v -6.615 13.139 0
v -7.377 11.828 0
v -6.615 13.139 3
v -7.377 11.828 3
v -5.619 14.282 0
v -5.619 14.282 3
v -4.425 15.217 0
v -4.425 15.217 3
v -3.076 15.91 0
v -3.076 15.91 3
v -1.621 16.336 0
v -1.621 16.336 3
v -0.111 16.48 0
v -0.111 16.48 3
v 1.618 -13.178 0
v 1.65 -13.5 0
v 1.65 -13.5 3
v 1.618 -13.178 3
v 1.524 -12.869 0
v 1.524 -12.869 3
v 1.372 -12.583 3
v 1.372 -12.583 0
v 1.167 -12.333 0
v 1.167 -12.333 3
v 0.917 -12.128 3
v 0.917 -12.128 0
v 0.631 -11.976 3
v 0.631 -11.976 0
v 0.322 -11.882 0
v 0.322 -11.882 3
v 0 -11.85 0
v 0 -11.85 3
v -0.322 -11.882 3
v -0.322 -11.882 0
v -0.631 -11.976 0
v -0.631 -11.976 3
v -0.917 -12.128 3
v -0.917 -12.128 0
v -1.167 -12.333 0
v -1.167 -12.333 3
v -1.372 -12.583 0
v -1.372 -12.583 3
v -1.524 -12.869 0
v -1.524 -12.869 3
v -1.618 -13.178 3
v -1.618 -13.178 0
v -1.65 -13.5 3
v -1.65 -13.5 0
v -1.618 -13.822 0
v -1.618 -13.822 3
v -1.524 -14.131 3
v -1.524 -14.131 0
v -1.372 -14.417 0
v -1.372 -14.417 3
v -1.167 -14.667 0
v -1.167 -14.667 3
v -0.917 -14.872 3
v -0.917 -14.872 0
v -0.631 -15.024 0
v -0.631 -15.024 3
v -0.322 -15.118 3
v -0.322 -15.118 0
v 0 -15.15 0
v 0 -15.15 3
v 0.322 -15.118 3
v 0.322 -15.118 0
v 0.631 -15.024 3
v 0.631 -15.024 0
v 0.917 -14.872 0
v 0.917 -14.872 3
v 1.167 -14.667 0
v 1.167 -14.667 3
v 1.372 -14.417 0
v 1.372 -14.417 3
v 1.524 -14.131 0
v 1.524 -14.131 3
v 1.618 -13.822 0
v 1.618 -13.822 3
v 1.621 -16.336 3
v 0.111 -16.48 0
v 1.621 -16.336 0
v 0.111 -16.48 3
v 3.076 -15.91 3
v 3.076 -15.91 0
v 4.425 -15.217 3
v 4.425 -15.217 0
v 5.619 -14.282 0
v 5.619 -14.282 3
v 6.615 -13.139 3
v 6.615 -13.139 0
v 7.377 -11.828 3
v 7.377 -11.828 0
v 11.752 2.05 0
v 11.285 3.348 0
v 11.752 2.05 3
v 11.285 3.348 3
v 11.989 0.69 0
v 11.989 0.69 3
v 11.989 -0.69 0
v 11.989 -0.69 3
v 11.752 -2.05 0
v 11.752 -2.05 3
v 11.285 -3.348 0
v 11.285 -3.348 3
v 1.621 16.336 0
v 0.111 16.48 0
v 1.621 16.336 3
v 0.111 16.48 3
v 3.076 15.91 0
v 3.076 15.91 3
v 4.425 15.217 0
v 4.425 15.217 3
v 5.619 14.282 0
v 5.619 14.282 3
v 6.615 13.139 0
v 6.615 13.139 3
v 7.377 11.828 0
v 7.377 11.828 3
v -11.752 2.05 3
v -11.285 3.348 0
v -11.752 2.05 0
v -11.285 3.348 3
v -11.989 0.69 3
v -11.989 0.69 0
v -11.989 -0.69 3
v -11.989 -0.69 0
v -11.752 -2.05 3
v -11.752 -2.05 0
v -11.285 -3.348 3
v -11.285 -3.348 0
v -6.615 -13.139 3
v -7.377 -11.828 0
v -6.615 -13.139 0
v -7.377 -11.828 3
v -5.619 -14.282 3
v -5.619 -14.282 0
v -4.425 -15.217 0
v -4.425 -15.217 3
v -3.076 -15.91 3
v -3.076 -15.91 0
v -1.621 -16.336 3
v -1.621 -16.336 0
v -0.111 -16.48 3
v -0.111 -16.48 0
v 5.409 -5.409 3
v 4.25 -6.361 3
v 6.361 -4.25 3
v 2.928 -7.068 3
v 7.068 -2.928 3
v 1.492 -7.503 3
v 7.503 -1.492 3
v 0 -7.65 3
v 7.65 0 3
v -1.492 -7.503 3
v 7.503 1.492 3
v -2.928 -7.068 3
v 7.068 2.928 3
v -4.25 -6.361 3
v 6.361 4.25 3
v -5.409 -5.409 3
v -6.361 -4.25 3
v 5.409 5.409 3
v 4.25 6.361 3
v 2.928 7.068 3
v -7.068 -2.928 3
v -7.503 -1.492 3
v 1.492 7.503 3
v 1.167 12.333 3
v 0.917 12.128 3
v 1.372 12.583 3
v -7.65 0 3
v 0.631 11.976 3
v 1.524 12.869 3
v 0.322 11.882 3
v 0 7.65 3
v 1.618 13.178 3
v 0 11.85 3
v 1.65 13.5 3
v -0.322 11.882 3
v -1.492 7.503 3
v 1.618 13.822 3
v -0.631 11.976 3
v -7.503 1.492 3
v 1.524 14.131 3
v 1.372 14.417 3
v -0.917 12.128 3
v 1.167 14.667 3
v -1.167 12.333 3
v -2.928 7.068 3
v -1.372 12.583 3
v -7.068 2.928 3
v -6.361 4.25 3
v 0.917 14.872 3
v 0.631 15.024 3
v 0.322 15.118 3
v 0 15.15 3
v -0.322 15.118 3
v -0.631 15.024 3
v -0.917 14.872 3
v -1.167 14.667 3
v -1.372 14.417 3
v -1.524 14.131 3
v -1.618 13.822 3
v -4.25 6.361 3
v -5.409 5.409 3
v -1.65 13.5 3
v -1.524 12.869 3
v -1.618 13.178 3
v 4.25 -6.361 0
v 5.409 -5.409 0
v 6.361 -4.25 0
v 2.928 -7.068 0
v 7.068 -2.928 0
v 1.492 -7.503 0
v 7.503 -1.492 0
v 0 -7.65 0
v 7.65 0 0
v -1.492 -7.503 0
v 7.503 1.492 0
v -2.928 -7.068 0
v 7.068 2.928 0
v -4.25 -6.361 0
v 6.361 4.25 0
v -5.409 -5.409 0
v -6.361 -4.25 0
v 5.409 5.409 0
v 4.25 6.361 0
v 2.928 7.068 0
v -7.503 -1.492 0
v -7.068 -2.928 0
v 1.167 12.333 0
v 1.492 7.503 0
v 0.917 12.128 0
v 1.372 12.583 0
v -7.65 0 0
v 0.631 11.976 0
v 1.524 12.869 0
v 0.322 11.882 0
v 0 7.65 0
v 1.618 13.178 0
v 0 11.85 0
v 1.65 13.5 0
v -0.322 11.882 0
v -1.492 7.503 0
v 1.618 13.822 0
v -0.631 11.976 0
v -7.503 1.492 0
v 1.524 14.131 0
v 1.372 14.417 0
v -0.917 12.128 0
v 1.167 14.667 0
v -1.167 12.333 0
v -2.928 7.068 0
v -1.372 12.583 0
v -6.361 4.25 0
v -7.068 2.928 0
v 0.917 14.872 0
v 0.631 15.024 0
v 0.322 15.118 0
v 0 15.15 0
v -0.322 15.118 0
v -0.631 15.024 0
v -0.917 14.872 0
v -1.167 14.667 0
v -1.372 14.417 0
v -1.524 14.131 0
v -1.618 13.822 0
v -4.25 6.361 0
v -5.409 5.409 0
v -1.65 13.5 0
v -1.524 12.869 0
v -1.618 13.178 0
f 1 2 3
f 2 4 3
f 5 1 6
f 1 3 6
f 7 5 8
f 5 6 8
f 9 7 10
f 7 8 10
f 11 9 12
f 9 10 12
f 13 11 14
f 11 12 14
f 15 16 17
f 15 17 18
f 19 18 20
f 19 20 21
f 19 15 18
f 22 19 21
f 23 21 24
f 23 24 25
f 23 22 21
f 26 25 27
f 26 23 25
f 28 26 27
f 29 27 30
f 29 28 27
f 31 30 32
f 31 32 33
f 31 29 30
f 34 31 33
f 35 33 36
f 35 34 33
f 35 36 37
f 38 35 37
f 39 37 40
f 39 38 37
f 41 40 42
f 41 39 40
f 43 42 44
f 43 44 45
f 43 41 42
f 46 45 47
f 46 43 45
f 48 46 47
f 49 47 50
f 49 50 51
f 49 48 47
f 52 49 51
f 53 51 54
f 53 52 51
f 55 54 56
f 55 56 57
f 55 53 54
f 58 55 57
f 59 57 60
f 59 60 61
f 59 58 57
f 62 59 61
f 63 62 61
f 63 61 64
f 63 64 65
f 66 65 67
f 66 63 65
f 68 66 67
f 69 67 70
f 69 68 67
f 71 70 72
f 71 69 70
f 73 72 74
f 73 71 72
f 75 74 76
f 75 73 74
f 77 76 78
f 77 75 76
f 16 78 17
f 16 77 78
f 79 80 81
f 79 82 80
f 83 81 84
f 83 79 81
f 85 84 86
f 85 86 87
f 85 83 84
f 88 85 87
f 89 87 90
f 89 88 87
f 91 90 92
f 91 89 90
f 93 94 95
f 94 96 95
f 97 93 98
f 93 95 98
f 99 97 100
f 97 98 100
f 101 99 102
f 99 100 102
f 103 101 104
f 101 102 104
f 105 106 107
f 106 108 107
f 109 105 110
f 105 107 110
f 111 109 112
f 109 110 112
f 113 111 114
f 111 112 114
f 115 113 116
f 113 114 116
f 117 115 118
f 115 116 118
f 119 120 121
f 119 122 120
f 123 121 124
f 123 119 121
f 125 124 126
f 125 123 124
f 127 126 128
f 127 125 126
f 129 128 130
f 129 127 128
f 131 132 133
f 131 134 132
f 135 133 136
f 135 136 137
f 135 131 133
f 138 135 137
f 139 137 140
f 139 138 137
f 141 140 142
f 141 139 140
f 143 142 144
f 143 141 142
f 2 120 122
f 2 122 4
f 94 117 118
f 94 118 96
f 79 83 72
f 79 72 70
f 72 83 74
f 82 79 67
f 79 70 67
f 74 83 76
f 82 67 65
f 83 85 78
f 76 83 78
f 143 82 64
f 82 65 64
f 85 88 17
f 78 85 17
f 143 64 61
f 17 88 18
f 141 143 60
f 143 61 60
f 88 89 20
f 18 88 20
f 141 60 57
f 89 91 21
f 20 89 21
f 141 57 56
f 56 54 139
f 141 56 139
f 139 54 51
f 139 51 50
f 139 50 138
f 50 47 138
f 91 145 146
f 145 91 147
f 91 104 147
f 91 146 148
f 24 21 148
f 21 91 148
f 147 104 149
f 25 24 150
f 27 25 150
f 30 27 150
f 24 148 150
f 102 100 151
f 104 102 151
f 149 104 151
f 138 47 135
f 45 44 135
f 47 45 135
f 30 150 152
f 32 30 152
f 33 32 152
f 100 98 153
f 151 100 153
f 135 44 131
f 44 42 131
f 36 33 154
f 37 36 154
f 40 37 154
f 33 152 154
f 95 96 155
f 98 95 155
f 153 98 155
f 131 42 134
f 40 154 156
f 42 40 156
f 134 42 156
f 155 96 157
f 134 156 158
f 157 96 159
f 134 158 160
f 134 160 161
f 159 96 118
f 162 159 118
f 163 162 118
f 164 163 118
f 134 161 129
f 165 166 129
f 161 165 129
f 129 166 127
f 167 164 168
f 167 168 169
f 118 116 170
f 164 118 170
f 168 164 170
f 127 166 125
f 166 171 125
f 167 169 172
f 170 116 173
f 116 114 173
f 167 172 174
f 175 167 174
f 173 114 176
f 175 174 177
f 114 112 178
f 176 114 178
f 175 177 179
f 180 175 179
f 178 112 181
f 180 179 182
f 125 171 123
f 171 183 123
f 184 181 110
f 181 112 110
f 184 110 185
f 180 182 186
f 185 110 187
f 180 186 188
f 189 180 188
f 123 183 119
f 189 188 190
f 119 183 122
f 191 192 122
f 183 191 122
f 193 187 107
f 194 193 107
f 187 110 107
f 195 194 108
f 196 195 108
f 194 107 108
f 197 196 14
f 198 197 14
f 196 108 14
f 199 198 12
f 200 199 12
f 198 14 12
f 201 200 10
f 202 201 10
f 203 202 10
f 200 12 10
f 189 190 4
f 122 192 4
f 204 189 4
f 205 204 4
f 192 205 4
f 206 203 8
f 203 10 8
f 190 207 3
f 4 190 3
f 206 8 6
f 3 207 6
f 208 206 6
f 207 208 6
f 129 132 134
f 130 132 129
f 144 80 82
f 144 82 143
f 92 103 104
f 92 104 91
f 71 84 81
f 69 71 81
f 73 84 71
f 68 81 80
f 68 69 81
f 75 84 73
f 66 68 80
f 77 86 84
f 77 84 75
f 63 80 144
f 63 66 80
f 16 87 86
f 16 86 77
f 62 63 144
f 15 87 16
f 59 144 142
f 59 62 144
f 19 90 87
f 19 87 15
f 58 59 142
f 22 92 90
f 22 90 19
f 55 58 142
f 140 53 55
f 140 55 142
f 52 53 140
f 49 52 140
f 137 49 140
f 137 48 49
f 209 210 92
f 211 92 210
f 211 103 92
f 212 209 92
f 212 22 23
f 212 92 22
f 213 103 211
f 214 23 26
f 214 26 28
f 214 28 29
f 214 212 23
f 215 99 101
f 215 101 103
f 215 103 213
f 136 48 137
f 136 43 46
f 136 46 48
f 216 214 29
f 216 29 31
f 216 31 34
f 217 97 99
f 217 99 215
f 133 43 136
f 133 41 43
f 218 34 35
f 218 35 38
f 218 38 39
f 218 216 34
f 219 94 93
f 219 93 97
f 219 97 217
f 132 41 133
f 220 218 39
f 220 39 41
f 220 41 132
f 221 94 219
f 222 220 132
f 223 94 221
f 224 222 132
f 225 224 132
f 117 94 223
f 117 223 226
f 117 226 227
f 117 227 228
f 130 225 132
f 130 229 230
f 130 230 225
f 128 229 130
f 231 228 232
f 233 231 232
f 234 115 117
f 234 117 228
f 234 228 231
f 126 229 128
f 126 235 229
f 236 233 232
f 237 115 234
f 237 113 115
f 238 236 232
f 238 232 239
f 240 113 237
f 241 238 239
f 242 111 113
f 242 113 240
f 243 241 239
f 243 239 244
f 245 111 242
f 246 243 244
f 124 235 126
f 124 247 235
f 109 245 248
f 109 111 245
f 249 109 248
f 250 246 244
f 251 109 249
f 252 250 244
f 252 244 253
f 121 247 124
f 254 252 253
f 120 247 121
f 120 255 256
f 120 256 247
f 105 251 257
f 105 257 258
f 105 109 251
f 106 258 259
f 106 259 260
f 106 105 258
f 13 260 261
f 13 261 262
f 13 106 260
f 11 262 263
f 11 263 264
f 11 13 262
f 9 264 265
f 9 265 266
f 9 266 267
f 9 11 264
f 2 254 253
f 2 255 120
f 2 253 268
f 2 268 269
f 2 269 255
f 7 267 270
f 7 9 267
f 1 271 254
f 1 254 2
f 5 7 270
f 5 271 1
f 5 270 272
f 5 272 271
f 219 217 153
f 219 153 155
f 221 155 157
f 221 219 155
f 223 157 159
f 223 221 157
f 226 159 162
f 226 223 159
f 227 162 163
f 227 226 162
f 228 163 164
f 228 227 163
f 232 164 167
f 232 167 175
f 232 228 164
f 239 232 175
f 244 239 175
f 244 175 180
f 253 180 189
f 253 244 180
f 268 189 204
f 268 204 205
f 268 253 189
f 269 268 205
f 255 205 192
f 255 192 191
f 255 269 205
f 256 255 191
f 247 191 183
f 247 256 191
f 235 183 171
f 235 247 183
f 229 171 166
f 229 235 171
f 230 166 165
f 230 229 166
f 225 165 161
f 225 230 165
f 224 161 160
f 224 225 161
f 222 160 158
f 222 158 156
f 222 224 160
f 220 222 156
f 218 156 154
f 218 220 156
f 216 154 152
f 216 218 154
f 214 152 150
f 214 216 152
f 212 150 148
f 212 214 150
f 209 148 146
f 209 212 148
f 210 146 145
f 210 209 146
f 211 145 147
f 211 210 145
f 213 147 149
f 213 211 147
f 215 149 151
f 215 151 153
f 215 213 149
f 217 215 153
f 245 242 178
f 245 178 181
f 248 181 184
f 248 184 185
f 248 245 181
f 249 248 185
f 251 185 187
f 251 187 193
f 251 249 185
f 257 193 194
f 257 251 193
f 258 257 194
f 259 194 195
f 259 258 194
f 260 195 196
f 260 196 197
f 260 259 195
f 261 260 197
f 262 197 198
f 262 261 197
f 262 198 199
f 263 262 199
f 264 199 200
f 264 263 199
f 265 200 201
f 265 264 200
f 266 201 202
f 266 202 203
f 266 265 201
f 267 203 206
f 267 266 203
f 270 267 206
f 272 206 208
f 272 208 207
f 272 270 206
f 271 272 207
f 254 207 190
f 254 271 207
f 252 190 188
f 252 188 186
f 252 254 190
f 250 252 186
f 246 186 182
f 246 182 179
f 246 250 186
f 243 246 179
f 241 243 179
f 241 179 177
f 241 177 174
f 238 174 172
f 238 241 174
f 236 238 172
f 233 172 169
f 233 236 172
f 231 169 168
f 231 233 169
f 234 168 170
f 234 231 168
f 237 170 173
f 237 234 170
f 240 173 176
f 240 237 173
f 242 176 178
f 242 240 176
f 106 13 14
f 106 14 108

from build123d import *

# Parameters (mm, degrees)
ESBO_O1_R                = 7.65
ESBO_O1_R_2              = 1.65
RESSALTO_EXTRUS_O1_DEPTH = 3
FILETE1_R                = 8


with BuildPart() as part:
    # Esboço1 → Ressalto-extrusão1 (new body)
    with BuildSketch(Plane.XY):
        Polygon((-12.827454307, 0), (-5.233177242, 16.48), (5.233177242, 16.48), (12.827454307, 0), (5.233177242, -16.48), (-5.233177242, -16.48), align=None)
        Circle(ESBO_O1_R, mode=Mode.SUBTRACT)
        with Locations((0, -13.5)):
            Circle(ESBO_O1_R_2, mode=Mode.SUBTRACT)
        with Locations((0, 13.5)):
            Circle(ESBO_O1_R_2, mode=Mode.SUBTRACT)
    extrude(amount=RESSALTO_EXTRUS_O1_DEPTH)

    # Filete1
    filete1_edges = [part.edges().sort_by_distance(p)[0] for p in [
        (5.233177242, -16.48, 1.5),
        (-5.233177242, -16.48, 1.5),
        (-12.827454307, 0, 1.5),
        (-5.233177242, 16.48, 1.5),
        (5.233177242, 16.48, 1.5),
        (12.827454307, 0, 1.5),
    ]]
    fillet(filete1_edges, radius=FILETE1_R)


solid = part.part
